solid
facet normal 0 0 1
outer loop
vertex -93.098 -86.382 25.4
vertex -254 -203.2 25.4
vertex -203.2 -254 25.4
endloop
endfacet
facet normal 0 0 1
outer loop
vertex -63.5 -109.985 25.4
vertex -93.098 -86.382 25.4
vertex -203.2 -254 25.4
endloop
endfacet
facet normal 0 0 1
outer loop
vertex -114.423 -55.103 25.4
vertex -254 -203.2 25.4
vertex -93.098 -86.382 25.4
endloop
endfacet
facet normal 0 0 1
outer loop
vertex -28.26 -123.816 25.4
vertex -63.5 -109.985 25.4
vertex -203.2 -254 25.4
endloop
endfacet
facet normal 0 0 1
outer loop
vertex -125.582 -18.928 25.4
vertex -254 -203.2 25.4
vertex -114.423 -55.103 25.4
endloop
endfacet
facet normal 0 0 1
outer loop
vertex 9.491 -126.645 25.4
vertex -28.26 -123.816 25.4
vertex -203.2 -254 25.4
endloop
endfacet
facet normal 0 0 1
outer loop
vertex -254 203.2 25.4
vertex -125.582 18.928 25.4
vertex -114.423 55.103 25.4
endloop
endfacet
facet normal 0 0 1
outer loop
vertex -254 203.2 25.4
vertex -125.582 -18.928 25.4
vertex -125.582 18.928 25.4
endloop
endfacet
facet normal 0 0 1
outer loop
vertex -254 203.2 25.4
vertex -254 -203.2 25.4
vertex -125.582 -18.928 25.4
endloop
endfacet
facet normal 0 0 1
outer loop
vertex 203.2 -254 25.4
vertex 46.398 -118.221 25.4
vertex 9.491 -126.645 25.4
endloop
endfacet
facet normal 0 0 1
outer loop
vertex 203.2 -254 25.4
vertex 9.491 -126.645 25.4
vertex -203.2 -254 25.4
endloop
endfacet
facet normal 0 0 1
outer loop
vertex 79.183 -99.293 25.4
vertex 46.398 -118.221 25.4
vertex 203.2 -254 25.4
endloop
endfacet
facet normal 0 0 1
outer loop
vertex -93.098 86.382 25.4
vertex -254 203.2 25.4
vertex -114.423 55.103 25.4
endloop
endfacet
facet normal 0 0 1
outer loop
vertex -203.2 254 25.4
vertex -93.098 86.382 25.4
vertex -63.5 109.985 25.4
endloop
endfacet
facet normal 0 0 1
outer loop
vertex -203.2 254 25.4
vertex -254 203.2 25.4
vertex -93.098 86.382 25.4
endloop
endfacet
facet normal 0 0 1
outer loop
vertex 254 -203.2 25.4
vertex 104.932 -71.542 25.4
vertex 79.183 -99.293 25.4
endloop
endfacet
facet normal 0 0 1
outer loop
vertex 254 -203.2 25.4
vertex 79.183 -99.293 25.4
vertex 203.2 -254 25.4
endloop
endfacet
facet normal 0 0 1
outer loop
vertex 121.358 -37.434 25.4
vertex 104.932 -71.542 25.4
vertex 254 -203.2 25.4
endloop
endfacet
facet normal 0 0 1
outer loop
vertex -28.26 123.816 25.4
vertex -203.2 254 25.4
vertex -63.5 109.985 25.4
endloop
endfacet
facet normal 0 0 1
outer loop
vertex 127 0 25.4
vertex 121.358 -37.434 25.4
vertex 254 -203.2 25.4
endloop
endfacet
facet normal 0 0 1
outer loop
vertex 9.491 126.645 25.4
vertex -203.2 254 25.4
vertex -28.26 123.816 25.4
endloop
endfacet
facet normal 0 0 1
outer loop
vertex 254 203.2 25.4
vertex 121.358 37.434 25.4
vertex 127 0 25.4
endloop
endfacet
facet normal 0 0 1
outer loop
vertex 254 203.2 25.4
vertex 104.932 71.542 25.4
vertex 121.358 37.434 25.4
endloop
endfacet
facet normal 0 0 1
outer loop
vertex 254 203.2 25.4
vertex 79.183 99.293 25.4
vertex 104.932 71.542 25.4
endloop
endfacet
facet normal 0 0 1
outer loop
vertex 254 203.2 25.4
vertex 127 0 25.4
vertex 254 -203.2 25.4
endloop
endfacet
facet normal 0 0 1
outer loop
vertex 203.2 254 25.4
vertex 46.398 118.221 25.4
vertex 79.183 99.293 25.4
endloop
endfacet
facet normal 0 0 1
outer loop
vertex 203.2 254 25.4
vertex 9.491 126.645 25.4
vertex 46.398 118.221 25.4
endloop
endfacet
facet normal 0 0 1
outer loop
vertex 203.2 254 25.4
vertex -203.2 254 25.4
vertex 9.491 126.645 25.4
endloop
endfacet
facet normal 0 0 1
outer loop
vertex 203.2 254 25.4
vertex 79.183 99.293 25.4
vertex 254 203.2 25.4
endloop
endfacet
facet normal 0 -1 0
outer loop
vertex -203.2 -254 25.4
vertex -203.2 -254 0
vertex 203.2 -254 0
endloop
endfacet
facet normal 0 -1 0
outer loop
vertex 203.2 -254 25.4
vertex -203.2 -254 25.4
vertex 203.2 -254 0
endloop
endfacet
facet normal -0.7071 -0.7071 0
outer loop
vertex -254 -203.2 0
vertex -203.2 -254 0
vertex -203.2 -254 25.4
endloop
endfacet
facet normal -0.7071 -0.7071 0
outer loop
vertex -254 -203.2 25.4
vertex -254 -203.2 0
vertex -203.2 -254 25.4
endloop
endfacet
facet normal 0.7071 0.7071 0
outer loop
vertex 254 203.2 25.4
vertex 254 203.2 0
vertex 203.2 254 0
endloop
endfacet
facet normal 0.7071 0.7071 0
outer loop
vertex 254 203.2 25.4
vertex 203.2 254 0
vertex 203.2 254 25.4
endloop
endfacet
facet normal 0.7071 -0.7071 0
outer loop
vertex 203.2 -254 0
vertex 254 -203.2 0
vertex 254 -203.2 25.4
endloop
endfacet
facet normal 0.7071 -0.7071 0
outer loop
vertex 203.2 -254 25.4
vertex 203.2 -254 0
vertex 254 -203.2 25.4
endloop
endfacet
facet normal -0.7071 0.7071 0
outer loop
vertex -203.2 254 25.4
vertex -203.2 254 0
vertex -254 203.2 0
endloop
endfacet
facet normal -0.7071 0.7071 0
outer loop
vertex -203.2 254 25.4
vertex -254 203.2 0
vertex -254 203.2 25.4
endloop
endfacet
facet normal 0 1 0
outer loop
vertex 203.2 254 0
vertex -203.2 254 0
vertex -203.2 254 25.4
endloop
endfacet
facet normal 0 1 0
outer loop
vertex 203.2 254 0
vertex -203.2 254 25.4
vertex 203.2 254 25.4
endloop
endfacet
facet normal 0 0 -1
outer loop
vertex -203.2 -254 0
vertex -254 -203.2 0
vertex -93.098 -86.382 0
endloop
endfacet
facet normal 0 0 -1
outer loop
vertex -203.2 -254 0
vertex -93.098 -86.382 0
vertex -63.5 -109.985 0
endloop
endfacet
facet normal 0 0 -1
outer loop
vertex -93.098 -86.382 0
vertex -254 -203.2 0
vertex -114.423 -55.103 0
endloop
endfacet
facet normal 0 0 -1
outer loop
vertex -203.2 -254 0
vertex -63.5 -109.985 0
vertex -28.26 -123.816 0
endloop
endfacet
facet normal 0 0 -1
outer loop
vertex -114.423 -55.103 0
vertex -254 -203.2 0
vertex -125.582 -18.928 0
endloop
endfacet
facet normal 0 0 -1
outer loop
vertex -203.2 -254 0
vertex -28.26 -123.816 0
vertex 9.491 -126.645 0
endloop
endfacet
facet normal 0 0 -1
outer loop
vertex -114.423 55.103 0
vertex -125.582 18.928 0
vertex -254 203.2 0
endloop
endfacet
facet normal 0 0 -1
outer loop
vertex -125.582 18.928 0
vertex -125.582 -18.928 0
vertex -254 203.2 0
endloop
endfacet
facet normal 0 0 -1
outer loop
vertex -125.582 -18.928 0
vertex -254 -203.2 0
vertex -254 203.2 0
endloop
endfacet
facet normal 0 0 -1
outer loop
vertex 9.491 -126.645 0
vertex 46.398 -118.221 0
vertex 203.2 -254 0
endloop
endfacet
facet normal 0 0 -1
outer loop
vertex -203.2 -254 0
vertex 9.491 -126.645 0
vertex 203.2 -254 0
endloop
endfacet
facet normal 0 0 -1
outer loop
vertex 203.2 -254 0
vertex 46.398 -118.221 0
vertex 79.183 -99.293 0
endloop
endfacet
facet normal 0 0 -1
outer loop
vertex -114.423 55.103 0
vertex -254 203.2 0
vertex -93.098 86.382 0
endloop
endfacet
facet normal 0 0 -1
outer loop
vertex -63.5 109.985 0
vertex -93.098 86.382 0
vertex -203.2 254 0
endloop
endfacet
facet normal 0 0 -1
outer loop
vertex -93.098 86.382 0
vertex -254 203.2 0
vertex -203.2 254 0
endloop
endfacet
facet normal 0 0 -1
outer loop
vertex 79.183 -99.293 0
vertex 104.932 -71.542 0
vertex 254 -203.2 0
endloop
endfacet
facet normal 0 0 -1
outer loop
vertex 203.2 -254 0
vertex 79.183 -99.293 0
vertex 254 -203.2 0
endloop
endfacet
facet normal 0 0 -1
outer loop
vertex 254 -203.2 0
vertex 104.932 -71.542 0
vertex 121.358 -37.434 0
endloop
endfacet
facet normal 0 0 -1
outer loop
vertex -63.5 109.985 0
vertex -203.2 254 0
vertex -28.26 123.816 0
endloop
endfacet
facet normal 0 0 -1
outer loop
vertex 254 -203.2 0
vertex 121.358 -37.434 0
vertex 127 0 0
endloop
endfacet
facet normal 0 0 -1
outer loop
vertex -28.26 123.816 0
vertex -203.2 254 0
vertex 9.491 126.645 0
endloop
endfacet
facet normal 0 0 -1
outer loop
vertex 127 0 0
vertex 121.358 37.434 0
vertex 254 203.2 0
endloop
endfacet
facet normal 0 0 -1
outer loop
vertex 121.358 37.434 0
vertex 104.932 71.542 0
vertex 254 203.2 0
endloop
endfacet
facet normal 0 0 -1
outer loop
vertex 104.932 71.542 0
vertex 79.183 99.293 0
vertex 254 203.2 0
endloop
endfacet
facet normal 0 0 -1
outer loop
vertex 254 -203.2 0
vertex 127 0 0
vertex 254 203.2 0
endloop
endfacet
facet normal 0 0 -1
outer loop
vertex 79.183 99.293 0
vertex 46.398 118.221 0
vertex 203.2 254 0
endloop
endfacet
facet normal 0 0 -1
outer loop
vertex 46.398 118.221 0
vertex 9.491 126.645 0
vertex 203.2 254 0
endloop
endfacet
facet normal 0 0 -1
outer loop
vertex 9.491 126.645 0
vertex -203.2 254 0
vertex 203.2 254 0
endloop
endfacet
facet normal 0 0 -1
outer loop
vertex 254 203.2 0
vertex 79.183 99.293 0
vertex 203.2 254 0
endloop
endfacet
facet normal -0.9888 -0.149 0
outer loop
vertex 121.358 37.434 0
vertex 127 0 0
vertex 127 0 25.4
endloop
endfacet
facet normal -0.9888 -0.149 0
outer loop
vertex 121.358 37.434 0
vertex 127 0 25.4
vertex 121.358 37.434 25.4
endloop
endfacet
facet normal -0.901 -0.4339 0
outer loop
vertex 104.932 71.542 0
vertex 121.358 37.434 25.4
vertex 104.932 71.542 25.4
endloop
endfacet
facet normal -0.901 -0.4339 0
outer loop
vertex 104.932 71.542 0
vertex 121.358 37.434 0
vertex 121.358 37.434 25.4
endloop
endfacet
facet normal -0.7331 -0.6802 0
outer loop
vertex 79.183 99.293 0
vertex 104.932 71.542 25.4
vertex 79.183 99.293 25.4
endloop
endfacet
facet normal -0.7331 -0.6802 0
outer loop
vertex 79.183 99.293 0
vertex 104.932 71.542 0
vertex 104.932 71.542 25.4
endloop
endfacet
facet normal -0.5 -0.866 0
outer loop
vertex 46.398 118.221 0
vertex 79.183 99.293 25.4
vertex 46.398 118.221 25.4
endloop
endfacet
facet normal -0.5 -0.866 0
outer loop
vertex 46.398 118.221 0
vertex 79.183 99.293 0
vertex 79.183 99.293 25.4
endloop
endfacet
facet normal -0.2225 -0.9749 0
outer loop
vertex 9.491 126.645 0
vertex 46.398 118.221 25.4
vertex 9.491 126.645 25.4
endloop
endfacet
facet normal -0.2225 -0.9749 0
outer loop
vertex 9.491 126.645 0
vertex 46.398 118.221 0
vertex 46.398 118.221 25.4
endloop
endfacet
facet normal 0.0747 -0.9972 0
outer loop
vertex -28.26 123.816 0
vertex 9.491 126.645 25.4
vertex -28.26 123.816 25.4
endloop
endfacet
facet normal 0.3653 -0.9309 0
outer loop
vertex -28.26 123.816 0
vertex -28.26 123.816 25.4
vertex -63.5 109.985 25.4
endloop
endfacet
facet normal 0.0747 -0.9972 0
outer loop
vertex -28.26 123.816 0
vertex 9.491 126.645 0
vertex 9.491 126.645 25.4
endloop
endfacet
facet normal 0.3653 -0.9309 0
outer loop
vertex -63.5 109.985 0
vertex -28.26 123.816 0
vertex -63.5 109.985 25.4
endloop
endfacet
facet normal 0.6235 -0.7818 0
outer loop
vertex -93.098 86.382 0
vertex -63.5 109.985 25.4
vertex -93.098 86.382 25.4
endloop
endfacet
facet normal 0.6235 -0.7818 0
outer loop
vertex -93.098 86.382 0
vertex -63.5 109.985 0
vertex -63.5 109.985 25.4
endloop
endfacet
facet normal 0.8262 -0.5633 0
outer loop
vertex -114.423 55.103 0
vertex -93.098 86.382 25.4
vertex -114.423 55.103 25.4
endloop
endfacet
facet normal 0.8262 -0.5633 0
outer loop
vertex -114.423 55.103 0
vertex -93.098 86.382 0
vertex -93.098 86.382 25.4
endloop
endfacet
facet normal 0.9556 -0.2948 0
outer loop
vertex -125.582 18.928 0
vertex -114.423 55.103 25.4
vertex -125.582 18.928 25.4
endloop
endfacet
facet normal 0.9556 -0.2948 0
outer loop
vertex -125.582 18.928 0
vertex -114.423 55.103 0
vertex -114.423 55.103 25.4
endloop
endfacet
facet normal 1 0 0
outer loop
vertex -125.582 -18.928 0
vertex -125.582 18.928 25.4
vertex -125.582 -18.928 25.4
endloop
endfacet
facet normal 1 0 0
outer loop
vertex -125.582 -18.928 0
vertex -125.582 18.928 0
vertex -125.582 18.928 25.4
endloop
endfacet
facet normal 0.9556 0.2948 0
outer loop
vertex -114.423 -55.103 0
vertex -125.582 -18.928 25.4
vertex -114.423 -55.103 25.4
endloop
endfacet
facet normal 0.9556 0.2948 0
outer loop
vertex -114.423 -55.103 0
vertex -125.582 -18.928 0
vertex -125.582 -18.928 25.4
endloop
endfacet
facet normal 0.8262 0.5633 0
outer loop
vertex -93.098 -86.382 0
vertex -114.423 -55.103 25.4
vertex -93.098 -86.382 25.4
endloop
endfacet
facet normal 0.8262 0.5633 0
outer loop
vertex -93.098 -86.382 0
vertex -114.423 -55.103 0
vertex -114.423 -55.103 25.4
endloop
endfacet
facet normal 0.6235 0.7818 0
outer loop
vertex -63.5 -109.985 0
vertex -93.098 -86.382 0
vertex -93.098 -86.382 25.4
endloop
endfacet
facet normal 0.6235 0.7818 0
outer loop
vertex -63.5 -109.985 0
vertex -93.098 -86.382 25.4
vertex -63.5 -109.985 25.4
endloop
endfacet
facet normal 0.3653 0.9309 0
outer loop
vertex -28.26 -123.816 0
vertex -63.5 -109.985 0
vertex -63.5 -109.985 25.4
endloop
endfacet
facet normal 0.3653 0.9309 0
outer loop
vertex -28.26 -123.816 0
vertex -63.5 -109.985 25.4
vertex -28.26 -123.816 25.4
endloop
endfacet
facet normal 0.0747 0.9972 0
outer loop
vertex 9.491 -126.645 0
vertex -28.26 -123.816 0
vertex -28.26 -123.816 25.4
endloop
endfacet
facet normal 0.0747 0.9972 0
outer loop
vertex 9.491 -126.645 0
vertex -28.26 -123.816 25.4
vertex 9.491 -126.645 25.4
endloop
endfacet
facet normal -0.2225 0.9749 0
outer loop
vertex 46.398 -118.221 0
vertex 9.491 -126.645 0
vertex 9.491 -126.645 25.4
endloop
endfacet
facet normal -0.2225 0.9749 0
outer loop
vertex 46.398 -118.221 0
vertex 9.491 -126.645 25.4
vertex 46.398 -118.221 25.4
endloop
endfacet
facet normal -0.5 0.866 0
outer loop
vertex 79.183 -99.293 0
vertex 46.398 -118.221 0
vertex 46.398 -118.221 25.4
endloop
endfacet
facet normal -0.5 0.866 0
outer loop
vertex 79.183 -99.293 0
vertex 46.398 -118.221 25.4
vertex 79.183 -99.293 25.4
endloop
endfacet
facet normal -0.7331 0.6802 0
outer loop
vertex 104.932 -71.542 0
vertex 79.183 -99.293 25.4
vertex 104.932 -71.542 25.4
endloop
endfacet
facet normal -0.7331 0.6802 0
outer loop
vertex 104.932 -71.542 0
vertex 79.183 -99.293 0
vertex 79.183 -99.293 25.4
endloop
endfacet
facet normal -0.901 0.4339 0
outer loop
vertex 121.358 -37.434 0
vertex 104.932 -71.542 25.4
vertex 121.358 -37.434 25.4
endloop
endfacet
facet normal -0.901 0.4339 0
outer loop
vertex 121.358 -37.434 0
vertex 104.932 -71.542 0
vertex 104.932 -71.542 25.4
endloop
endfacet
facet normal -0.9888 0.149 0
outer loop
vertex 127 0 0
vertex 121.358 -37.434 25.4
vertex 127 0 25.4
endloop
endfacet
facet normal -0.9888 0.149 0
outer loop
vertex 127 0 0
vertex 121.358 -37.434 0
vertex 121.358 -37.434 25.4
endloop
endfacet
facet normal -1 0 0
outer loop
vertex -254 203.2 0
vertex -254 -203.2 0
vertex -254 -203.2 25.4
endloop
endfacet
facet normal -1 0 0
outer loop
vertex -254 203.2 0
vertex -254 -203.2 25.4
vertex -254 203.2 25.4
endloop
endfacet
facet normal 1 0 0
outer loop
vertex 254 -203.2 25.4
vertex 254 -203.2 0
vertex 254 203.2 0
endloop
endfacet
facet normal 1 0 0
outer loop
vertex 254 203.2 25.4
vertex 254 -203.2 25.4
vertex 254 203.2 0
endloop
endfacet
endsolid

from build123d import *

# Parameters (mm, degrees)
F0_W     = 508
F0_H     = 508
F0_R     = 127
F1_DEPTH = 25.4
F2_SIZE  = 50.8


with BuildPart() as f1:
    # F0 (on Top) → F1 (new body)
    with BuildSketch(Plane.XY):
        Rectangle(F0_W, F0_H)
        Circle(F0_R, mode=Mode.SUBTRACT)
    extrude(amount=F1_DEPTH)

    # F2
    f2_edges = [f1.edges().sort_by_distance(p)[0] for p in [
        (-254, -254, 12.7),
        (254, -254, 12.7),
        (254, 254, 12.7),
        (-254, 254, 12.7),
    ]]
    chamfer(f2_edges, length=F2_SIZE)


solid = f1.part
